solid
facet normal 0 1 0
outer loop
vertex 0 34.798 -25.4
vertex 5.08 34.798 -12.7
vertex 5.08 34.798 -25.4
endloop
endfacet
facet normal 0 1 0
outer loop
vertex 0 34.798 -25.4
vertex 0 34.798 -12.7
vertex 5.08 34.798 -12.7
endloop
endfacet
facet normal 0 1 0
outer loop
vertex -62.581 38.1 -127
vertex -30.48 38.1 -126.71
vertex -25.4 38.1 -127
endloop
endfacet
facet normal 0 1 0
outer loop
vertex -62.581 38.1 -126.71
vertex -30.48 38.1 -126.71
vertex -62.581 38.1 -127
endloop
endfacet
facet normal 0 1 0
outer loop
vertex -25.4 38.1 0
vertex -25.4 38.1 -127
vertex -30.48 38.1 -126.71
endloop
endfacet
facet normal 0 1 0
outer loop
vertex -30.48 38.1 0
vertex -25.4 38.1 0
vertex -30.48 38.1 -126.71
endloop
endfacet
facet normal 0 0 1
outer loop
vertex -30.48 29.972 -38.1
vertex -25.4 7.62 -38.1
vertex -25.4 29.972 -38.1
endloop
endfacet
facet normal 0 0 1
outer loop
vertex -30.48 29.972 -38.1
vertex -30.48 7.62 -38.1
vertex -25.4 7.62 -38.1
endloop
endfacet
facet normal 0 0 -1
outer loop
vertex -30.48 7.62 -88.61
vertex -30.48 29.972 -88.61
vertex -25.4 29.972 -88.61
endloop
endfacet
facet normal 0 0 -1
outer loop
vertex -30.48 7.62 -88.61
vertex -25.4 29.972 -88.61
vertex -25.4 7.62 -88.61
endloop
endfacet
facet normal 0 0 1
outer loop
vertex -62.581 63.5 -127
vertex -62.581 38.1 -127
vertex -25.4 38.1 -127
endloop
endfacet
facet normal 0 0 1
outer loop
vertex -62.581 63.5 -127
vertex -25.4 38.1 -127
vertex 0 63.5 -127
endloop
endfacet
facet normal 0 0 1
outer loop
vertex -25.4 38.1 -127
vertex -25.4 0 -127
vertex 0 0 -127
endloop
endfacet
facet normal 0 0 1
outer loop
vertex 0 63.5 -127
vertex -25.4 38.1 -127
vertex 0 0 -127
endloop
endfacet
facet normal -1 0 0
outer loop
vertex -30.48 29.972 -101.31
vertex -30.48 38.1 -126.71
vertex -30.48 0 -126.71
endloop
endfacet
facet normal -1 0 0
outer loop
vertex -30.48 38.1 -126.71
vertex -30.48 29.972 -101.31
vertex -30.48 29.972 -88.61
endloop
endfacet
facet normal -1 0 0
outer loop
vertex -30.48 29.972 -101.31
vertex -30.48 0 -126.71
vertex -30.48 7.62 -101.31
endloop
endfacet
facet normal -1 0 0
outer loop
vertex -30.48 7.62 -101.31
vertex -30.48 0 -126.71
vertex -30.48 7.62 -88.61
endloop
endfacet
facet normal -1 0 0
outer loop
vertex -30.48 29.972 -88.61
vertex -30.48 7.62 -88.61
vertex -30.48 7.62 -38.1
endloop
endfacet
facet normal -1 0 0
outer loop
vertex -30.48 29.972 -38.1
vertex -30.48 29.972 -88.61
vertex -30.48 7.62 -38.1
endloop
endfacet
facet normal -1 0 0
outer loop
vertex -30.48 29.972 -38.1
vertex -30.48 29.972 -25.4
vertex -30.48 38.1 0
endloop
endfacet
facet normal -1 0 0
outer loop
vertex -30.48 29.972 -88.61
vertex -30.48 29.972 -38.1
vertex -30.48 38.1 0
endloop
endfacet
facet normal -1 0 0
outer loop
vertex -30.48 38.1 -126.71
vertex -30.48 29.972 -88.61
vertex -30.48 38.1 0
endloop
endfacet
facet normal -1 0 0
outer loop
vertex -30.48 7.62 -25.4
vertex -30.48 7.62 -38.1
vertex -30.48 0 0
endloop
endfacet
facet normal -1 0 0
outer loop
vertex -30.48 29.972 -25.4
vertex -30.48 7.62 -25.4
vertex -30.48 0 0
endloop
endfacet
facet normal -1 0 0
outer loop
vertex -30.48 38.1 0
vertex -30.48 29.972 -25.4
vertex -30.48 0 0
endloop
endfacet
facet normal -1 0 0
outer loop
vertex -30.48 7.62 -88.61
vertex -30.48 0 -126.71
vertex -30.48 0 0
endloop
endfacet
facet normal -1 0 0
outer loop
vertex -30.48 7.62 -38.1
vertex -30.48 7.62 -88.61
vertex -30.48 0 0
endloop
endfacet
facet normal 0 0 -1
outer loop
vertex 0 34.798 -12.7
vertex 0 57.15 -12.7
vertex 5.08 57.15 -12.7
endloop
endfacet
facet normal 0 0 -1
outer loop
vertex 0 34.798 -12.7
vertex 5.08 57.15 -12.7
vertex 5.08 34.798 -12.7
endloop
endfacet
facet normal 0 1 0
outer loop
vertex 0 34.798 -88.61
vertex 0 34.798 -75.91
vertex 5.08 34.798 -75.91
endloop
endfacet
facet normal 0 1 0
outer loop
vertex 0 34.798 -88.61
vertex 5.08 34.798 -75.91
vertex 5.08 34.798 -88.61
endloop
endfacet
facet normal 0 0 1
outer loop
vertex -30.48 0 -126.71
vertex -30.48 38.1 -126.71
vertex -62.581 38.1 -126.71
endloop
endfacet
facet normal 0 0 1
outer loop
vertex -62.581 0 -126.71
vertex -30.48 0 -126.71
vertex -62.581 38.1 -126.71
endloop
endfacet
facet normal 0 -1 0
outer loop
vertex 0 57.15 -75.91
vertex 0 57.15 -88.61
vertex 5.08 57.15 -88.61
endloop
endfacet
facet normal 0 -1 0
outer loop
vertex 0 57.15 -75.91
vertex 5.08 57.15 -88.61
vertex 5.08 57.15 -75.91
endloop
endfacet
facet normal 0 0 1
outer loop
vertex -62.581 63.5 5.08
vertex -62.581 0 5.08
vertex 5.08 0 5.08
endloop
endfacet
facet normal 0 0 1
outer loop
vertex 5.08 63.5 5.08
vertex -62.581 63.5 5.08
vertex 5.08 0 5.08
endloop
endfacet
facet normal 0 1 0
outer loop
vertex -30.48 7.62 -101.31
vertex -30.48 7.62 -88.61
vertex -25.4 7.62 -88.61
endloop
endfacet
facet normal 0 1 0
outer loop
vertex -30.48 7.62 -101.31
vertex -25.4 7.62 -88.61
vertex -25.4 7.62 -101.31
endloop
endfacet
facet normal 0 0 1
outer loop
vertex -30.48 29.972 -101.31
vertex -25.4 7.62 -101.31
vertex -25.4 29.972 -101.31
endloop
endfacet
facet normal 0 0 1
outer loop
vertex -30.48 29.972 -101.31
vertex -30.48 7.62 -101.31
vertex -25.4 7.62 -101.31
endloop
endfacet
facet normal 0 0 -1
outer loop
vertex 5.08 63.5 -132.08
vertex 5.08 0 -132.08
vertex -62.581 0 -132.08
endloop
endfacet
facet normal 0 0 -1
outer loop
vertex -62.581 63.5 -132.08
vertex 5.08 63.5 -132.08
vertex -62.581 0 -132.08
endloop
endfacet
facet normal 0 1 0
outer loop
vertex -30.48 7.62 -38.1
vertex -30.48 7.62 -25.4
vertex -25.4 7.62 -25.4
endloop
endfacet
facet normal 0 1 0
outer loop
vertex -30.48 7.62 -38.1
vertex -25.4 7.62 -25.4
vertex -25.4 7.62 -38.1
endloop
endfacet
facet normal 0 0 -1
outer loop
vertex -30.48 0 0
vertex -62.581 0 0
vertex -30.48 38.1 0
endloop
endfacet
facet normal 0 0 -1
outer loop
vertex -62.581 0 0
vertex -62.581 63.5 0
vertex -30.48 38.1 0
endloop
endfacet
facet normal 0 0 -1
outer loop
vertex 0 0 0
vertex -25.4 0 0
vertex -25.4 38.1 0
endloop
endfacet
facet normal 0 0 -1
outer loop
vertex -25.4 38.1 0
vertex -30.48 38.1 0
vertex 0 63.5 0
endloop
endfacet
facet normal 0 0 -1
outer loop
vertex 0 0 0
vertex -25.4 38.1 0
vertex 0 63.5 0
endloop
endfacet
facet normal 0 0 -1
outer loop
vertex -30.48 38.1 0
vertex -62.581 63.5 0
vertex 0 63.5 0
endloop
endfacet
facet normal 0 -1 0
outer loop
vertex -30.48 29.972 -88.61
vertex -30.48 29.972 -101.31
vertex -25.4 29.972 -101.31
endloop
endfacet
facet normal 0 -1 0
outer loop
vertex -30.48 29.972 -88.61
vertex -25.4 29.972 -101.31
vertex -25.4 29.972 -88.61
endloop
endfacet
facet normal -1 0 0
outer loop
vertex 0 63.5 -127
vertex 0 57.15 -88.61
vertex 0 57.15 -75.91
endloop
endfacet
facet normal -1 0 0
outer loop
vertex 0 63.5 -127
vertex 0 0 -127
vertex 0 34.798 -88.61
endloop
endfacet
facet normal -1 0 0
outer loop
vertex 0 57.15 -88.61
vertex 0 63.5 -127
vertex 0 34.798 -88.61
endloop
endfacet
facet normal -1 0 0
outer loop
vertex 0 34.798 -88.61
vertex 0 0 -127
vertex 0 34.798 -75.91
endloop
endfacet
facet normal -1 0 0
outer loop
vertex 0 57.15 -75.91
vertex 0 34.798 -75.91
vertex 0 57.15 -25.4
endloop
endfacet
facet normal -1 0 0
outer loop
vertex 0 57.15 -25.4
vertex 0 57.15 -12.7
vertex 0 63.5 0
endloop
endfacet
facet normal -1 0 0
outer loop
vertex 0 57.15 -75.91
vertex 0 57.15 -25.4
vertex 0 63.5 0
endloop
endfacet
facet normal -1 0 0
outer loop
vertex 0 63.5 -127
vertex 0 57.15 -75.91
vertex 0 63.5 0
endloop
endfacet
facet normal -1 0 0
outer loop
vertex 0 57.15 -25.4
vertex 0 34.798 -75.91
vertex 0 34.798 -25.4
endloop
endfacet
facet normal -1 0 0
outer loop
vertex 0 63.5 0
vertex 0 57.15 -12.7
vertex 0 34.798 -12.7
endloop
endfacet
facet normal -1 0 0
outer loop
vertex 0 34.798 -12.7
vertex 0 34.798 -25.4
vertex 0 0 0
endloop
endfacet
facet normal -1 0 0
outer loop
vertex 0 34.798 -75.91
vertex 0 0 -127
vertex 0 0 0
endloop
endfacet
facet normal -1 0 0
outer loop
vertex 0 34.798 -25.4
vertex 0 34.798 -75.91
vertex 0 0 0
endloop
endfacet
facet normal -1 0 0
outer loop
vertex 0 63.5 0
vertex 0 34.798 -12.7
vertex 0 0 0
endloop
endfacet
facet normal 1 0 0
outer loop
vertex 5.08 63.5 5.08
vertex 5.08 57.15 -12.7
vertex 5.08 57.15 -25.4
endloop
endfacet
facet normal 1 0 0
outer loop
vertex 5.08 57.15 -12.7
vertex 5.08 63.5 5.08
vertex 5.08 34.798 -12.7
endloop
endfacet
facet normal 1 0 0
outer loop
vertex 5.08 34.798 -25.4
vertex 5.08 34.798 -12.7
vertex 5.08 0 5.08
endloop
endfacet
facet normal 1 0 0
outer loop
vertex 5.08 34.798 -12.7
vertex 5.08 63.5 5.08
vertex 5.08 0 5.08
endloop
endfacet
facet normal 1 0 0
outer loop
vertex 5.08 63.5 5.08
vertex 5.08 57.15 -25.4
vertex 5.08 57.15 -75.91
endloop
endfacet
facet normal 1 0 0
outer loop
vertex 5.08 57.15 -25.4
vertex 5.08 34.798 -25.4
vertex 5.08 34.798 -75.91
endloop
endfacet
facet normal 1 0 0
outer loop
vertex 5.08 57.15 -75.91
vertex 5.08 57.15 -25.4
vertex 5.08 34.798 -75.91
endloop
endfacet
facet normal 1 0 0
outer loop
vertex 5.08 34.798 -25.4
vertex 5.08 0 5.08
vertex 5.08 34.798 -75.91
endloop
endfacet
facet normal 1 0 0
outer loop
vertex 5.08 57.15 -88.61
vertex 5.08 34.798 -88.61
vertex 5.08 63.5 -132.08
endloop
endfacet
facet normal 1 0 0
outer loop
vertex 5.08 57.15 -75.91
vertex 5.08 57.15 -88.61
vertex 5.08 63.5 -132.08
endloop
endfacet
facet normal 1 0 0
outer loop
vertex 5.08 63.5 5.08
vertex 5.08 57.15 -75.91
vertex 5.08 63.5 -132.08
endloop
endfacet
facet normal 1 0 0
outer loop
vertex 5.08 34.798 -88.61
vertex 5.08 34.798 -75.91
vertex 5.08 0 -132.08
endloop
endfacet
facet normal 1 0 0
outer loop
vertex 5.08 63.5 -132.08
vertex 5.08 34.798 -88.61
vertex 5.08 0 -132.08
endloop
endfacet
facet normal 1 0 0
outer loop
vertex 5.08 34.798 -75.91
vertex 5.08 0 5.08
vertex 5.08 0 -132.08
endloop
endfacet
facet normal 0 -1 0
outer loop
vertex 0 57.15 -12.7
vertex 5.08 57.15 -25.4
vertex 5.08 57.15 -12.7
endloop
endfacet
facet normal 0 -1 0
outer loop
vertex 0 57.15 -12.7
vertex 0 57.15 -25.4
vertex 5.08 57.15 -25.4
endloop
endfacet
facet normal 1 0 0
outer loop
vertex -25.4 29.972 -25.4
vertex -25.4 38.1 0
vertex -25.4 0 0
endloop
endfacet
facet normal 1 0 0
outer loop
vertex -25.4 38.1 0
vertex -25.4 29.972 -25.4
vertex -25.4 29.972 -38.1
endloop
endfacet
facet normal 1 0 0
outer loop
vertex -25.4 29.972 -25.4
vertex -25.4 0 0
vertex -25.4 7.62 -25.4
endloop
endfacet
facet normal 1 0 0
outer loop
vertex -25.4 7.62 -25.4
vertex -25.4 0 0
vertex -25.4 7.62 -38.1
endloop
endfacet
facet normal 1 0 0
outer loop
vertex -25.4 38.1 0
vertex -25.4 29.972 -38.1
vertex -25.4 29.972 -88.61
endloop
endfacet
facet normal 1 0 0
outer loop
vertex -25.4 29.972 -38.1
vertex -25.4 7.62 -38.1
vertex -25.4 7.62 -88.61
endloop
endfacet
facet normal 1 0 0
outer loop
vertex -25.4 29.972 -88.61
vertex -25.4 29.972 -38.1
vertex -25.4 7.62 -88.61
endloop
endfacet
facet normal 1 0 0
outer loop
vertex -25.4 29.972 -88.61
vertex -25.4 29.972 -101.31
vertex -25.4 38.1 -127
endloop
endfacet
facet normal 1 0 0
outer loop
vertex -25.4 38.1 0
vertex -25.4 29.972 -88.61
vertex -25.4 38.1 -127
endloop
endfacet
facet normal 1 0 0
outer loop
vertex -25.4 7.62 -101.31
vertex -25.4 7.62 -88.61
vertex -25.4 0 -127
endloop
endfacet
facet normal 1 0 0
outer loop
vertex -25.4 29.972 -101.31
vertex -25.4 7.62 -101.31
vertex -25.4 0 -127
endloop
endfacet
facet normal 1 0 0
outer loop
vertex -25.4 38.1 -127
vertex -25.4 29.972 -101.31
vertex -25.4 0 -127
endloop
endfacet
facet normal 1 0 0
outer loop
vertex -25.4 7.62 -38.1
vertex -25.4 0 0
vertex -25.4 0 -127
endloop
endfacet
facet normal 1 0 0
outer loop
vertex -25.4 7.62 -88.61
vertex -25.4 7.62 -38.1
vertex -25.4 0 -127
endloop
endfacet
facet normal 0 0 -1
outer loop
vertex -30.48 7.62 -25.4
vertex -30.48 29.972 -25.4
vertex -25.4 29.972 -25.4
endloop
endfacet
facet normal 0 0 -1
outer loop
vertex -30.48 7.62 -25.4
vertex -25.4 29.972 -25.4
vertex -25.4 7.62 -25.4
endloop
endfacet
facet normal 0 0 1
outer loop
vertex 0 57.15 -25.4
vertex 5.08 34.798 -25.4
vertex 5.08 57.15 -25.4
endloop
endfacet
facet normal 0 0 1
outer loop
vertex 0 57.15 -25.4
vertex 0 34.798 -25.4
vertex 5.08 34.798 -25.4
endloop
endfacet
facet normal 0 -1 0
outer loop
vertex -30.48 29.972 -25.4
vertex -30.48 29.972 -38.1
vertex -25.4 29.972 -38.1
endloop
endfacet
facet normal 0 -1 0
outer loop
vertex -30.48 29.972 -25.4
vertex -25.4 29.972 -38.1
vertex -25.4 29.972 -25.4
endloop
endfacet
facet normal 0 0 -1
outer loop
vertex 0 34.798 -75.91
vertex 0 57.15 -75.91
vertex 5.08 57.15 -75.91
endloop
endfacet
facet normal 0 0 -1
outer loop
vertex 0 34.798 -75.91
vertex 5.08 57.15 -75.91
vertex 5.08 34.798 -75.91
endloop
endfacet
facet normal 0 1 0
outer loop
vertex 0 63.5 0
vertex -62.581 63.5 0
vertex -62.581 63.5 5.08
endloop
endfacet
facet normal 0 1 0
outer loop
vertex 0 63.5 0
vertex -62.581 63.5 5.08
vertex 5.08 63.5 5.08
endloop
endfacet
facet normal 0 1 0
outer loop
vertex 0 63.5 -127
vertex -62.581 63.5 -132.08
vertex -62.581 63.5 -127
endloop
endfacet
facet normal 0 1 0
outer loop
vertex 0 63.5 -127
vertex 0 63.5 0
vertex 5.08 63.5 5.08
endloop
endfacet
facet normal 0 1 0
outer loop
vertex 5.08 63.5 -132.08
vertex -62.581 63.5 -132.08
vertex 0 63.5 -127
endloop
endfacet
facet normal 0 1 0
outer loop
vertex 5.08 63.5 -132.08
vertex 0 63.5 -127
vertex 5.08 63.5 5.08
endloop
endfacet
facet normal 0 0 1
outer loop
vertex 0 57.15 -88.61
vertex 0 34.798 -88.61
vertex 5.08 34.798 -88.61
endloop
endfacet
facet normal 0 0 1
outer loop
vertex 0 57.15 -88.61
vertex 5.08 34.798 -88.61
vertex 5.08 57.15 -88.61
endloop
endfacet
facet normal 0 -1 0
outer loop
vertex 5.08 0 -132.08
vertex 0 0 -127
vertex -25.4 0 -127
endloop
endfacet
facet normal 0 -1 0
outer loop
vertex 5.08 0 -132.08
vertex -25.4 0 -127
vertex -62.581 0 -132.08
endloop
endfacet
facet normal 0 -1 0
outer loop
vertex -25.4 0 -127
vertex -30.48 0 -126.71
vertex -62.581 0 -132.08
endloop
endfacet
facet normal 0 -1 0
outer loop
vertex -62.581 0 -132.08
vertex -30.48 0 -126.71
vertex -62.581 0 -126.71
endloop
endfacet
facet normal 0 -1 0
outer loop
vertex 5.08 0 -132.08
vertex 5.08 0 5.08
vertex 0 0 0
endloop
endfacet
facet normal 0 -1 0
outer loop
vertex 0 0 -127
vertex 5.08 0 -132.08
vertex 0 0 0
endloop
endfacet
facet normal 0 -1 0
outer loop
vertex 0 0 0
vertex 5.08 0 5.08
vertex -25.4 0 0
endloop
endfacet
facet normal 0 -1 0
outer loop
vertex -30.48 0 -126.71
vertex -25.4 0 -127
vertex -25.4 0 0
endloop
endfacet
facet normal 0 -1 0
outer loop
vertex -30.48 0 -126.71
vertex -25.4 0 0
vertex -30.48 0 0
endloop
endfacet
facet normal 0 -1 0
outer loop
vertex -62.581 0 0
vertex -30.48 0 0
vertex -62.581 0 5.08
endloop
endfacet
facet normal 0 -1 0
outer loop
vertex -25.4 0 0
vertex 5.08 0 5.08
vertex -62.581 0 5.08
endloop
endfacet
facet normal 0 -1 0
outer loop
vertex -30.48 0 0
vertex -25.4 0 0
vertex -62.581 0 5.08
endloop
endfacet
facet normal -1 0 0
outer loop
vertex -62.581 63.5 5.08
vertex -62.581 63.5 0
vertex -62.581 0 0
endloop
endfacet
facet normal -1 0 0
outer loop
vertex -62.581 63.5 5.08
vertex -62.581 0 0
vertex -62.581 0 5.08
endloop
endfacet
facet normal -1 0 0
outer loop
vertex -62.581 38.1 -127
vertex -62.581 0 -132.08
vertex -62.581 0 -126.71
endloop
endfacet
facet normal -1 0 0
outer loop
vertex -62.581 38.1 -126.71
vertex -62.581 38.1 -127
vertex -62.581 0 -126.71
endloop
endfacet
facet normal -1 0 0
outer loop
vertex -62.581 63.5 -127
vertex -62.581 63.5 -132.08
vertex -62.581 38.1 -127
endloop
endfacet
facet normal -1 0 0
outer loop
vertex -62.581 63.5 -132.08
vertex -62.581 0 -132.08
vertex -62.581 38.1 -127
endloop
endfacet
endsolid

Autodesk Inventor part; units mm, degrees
ref_plane "YZ Plane" through (0, 0, 0) normal (1, 0, 0) x (0, 1, 0)
ref_plane "XZ Plane" through (0, 0, 0) normal (0, 1, 0) x (-1, 0, 0)
ref_plane "XY Plane" through (0, 0, 0) normal (0, 0, 1) x (1, 0, 0)
sketch "Sketch1" plane through (0, 0, 0) normal (0, 1, 0) x (-1, 0, 0)
  line L0 (0, 0) -> (25.4, 0)
  line L1 (25.4, 0) -> (25.4, -127)
  line L2 (25.4, -127) -> (0, -127)
  line L3 (0, -127) -> (0, 0)
  line L4 (30.48, 5.08) -> (-5.08, 5.08)
  line L5 (-5.08, 5.08) -> (-5.08, -132.08)
  line L6 (-5.08, -132.08) -> (30.48, -132.08)
  line L7 (30.48, -132.08) -> (30.48, 5.08)
  dimension "d0" = 25.4
  dimension "d1" = 127
  dimension "d2" = 5.08
  dimension "d3" = 5.08
  dimension "d4" = 5.08
  dimension "d5" = 5.08
extrude "Extrusion1" add sketch "Sketch1" along normal blind 38.1
sketch "Sketch2" plane through (0, 38.1, 0) normal (0, 1, 0) x (1, 0, 0)
  line L0 (-30.48, -5.08) -> (5.08, -5.08) projected
  line L1 (5.08, -5.08) -> (-62.5812, -5.08)
  line L2 (-62.5812, -5.08) -> (-62.5812, 0)
  line L3 (-62.5812, 0) -> (0, 0)
  line L4 (-25.4, 127) -> (0, 127) projected
  line L5 (0, 127) -> (-62.5812, 127)
  line L6 (5.08, -5.08) -> (5.08, 132.08) projected
  line L7 (5.08, -5.08) -> (-62.5812, -5.08)
  line L8 (-62.5812, 132.08) -> (5.08, 132.08)
  line L9 (5.08, 132.08) -> (5.08, -5.08)
  line L10 (-62.5812, 132.08) -> (-47.0844, 132.08)
  line L11 (-62.5812, 127) -> (-62.5812, 132.08)
  line L12 (0, 127) -> (0, 0) projected
  line L13 (0, 0) -> (0, 127)
  line L14 (0, 127) -> (-62.5812, 127)
  line L15 (-62.5812, 132.08) -> (3.2473, 132.08)
  line L16 (5.08, 132.08) -> (-30.48, 132.08) projected
extrude "Extrusion2" add sketch "Sketch2" along normal blind 25.4
sketch "Sketch5" plane through (0, 38.1, 0) normal (0, -1, 0) x (1, 0, 0)
  line L0 (-62.5812, -132.08) -> (-62.5812, -127) projected
  line L1 (-30.48, -132.08) -> (-30.48, 5.08) projected
  line L2 (-62.5812, -132.08) -> (-30.48, -132.08)
  line L3 (-30.48, -132.08) -> (-30.48, -126.7104)
  line L4 (-30.48, -126.7104) -> (-62.5812, -126.7104)
  line L5 (-62.5812, -126.7104) -> (-62.5812, -132.08)
  line L6 (-62.5812, 0) -> (-62.5812, 5.08) projected
  line L7 (-30.48, 5.08) -> (5.08, 5.08) projected
  line L8 (-62.5812, 0) -> (-30.48, 0)
  line L9 (-30.48, 0) -> (-30.48, 5.08)
  line L10 (-30.48, 5.08) -> (-62.5812, 5.08)
  line L11 (-62.5812, 5.08) -> (-62.5812, 0)
  point P0 (0, 0)
extrude "Extrusion3" add sketch "Sketch5" along normal blind 38.1
sketch "Sketch6" plane through (-30.48, 0, 0) normal (-1, 0, 0) x (0, 0, 1)
  line L0 (-25.4, 7.62) -> (-38.1, 7.62)
  line L1 (-38.1, 7.62) -> (-38.1, 29.972)
  line L2 (-38.1, 29.972) -> (-25.4, 29.972)
  line L3 (-25.4, 29.972) -> (-25.4, 7.62)
  line L4 (-126.7104, 0) -> (0, 0) projected
  line L5 (0, 63.5) -> (0, 0) projected
  line L6 (-88.6104, 7.62) -> (-101.3104, 7.62)
  line L7 (-101.3104, 7.62) -> (-101.3104, 29.972)
  line L8 (-101.3104, 29.972) -> (-88.6104, 29.972)
  line L9 (-88.6104, 29.972) -> (-88.6104, 7.62)
  line L10 (-126.7104, 38.1) -> (-126.7104, 0) projected
  point P0 (-25.4, 18.796)
  point P1 (-88.6104, 18.796)
  point P2 (-126.7104, 19.05)
  point P3 (-101.3104, 18.796)
  dimension "d12" = 12.7
  dimension "d13" = 22.352
  dimension "d14" = 7.62
  dimension "d15" = 25.4
  dimension "d16" = 12.7
  dimension "d17" = 22.352
  dimension "d18" = 25.4
  dimension "d19" = 7.62
extrude "Extrusion4" cut sketch "Sketch6" against normal blind 12.7
sketch "Sketch7" plane through (0, 0, -127) normal (-1, 0, 0) x (0, 0, 1)
  line L0 (51.0896, 34.798) -> (38.3896, 34.798)
  line L1 (38.3896, 34.798) -> (38.3896, 57.15)
  line L2 (38.3896, 57.15) -> (51.0896, 57.15)
  line L3 (51.0896, 57.15) -> (51.0896, 34.798)
  line L4 (38.3896, 29.972) -> (38.3896, 7.62) projected
  line L5 (0, 63.5) -> (127, 63.5) projected
  line L6 (114.3, 34.798) -> (101.6, 34.798)
  line L7 (101.6, 34.798) -> (101.6, 57.15)
  line L8 (101.6, 57.15) -> (114.3, 57.15)
  line L9 (114.3, 57.15) -> (114.3, 34.798)
  line L10 (101.6, 31.5595) -> (101.6, 9.2075)
  line L11 (101.6, 29.972) -> (101.6, 7.62) projected
  point P0 (127, 0)
  point P1 (51.0896, 45.974)
  point P2 (38.3896, 18.796)
  point P3 (44.7396, 57.15)
  point P4 (114.3, 45.974)
  point P5 (101.6, 20.3835)
  point P6 (107.95, 57.15)
  dimension "d22" = 12.7
  dimension "d23" = 22.352
  dimension "d24" = 0
  dimension "d25" = 6.35
  dimension "d26" = 12.7
  dimension "d27" = 22.352
  dimension "d28" = 0
  dimension "d29" = 6.35
extrude "Extrusion5" cut sketch "Sketch7" against normal blind 12.7
properties part number "Base1"
